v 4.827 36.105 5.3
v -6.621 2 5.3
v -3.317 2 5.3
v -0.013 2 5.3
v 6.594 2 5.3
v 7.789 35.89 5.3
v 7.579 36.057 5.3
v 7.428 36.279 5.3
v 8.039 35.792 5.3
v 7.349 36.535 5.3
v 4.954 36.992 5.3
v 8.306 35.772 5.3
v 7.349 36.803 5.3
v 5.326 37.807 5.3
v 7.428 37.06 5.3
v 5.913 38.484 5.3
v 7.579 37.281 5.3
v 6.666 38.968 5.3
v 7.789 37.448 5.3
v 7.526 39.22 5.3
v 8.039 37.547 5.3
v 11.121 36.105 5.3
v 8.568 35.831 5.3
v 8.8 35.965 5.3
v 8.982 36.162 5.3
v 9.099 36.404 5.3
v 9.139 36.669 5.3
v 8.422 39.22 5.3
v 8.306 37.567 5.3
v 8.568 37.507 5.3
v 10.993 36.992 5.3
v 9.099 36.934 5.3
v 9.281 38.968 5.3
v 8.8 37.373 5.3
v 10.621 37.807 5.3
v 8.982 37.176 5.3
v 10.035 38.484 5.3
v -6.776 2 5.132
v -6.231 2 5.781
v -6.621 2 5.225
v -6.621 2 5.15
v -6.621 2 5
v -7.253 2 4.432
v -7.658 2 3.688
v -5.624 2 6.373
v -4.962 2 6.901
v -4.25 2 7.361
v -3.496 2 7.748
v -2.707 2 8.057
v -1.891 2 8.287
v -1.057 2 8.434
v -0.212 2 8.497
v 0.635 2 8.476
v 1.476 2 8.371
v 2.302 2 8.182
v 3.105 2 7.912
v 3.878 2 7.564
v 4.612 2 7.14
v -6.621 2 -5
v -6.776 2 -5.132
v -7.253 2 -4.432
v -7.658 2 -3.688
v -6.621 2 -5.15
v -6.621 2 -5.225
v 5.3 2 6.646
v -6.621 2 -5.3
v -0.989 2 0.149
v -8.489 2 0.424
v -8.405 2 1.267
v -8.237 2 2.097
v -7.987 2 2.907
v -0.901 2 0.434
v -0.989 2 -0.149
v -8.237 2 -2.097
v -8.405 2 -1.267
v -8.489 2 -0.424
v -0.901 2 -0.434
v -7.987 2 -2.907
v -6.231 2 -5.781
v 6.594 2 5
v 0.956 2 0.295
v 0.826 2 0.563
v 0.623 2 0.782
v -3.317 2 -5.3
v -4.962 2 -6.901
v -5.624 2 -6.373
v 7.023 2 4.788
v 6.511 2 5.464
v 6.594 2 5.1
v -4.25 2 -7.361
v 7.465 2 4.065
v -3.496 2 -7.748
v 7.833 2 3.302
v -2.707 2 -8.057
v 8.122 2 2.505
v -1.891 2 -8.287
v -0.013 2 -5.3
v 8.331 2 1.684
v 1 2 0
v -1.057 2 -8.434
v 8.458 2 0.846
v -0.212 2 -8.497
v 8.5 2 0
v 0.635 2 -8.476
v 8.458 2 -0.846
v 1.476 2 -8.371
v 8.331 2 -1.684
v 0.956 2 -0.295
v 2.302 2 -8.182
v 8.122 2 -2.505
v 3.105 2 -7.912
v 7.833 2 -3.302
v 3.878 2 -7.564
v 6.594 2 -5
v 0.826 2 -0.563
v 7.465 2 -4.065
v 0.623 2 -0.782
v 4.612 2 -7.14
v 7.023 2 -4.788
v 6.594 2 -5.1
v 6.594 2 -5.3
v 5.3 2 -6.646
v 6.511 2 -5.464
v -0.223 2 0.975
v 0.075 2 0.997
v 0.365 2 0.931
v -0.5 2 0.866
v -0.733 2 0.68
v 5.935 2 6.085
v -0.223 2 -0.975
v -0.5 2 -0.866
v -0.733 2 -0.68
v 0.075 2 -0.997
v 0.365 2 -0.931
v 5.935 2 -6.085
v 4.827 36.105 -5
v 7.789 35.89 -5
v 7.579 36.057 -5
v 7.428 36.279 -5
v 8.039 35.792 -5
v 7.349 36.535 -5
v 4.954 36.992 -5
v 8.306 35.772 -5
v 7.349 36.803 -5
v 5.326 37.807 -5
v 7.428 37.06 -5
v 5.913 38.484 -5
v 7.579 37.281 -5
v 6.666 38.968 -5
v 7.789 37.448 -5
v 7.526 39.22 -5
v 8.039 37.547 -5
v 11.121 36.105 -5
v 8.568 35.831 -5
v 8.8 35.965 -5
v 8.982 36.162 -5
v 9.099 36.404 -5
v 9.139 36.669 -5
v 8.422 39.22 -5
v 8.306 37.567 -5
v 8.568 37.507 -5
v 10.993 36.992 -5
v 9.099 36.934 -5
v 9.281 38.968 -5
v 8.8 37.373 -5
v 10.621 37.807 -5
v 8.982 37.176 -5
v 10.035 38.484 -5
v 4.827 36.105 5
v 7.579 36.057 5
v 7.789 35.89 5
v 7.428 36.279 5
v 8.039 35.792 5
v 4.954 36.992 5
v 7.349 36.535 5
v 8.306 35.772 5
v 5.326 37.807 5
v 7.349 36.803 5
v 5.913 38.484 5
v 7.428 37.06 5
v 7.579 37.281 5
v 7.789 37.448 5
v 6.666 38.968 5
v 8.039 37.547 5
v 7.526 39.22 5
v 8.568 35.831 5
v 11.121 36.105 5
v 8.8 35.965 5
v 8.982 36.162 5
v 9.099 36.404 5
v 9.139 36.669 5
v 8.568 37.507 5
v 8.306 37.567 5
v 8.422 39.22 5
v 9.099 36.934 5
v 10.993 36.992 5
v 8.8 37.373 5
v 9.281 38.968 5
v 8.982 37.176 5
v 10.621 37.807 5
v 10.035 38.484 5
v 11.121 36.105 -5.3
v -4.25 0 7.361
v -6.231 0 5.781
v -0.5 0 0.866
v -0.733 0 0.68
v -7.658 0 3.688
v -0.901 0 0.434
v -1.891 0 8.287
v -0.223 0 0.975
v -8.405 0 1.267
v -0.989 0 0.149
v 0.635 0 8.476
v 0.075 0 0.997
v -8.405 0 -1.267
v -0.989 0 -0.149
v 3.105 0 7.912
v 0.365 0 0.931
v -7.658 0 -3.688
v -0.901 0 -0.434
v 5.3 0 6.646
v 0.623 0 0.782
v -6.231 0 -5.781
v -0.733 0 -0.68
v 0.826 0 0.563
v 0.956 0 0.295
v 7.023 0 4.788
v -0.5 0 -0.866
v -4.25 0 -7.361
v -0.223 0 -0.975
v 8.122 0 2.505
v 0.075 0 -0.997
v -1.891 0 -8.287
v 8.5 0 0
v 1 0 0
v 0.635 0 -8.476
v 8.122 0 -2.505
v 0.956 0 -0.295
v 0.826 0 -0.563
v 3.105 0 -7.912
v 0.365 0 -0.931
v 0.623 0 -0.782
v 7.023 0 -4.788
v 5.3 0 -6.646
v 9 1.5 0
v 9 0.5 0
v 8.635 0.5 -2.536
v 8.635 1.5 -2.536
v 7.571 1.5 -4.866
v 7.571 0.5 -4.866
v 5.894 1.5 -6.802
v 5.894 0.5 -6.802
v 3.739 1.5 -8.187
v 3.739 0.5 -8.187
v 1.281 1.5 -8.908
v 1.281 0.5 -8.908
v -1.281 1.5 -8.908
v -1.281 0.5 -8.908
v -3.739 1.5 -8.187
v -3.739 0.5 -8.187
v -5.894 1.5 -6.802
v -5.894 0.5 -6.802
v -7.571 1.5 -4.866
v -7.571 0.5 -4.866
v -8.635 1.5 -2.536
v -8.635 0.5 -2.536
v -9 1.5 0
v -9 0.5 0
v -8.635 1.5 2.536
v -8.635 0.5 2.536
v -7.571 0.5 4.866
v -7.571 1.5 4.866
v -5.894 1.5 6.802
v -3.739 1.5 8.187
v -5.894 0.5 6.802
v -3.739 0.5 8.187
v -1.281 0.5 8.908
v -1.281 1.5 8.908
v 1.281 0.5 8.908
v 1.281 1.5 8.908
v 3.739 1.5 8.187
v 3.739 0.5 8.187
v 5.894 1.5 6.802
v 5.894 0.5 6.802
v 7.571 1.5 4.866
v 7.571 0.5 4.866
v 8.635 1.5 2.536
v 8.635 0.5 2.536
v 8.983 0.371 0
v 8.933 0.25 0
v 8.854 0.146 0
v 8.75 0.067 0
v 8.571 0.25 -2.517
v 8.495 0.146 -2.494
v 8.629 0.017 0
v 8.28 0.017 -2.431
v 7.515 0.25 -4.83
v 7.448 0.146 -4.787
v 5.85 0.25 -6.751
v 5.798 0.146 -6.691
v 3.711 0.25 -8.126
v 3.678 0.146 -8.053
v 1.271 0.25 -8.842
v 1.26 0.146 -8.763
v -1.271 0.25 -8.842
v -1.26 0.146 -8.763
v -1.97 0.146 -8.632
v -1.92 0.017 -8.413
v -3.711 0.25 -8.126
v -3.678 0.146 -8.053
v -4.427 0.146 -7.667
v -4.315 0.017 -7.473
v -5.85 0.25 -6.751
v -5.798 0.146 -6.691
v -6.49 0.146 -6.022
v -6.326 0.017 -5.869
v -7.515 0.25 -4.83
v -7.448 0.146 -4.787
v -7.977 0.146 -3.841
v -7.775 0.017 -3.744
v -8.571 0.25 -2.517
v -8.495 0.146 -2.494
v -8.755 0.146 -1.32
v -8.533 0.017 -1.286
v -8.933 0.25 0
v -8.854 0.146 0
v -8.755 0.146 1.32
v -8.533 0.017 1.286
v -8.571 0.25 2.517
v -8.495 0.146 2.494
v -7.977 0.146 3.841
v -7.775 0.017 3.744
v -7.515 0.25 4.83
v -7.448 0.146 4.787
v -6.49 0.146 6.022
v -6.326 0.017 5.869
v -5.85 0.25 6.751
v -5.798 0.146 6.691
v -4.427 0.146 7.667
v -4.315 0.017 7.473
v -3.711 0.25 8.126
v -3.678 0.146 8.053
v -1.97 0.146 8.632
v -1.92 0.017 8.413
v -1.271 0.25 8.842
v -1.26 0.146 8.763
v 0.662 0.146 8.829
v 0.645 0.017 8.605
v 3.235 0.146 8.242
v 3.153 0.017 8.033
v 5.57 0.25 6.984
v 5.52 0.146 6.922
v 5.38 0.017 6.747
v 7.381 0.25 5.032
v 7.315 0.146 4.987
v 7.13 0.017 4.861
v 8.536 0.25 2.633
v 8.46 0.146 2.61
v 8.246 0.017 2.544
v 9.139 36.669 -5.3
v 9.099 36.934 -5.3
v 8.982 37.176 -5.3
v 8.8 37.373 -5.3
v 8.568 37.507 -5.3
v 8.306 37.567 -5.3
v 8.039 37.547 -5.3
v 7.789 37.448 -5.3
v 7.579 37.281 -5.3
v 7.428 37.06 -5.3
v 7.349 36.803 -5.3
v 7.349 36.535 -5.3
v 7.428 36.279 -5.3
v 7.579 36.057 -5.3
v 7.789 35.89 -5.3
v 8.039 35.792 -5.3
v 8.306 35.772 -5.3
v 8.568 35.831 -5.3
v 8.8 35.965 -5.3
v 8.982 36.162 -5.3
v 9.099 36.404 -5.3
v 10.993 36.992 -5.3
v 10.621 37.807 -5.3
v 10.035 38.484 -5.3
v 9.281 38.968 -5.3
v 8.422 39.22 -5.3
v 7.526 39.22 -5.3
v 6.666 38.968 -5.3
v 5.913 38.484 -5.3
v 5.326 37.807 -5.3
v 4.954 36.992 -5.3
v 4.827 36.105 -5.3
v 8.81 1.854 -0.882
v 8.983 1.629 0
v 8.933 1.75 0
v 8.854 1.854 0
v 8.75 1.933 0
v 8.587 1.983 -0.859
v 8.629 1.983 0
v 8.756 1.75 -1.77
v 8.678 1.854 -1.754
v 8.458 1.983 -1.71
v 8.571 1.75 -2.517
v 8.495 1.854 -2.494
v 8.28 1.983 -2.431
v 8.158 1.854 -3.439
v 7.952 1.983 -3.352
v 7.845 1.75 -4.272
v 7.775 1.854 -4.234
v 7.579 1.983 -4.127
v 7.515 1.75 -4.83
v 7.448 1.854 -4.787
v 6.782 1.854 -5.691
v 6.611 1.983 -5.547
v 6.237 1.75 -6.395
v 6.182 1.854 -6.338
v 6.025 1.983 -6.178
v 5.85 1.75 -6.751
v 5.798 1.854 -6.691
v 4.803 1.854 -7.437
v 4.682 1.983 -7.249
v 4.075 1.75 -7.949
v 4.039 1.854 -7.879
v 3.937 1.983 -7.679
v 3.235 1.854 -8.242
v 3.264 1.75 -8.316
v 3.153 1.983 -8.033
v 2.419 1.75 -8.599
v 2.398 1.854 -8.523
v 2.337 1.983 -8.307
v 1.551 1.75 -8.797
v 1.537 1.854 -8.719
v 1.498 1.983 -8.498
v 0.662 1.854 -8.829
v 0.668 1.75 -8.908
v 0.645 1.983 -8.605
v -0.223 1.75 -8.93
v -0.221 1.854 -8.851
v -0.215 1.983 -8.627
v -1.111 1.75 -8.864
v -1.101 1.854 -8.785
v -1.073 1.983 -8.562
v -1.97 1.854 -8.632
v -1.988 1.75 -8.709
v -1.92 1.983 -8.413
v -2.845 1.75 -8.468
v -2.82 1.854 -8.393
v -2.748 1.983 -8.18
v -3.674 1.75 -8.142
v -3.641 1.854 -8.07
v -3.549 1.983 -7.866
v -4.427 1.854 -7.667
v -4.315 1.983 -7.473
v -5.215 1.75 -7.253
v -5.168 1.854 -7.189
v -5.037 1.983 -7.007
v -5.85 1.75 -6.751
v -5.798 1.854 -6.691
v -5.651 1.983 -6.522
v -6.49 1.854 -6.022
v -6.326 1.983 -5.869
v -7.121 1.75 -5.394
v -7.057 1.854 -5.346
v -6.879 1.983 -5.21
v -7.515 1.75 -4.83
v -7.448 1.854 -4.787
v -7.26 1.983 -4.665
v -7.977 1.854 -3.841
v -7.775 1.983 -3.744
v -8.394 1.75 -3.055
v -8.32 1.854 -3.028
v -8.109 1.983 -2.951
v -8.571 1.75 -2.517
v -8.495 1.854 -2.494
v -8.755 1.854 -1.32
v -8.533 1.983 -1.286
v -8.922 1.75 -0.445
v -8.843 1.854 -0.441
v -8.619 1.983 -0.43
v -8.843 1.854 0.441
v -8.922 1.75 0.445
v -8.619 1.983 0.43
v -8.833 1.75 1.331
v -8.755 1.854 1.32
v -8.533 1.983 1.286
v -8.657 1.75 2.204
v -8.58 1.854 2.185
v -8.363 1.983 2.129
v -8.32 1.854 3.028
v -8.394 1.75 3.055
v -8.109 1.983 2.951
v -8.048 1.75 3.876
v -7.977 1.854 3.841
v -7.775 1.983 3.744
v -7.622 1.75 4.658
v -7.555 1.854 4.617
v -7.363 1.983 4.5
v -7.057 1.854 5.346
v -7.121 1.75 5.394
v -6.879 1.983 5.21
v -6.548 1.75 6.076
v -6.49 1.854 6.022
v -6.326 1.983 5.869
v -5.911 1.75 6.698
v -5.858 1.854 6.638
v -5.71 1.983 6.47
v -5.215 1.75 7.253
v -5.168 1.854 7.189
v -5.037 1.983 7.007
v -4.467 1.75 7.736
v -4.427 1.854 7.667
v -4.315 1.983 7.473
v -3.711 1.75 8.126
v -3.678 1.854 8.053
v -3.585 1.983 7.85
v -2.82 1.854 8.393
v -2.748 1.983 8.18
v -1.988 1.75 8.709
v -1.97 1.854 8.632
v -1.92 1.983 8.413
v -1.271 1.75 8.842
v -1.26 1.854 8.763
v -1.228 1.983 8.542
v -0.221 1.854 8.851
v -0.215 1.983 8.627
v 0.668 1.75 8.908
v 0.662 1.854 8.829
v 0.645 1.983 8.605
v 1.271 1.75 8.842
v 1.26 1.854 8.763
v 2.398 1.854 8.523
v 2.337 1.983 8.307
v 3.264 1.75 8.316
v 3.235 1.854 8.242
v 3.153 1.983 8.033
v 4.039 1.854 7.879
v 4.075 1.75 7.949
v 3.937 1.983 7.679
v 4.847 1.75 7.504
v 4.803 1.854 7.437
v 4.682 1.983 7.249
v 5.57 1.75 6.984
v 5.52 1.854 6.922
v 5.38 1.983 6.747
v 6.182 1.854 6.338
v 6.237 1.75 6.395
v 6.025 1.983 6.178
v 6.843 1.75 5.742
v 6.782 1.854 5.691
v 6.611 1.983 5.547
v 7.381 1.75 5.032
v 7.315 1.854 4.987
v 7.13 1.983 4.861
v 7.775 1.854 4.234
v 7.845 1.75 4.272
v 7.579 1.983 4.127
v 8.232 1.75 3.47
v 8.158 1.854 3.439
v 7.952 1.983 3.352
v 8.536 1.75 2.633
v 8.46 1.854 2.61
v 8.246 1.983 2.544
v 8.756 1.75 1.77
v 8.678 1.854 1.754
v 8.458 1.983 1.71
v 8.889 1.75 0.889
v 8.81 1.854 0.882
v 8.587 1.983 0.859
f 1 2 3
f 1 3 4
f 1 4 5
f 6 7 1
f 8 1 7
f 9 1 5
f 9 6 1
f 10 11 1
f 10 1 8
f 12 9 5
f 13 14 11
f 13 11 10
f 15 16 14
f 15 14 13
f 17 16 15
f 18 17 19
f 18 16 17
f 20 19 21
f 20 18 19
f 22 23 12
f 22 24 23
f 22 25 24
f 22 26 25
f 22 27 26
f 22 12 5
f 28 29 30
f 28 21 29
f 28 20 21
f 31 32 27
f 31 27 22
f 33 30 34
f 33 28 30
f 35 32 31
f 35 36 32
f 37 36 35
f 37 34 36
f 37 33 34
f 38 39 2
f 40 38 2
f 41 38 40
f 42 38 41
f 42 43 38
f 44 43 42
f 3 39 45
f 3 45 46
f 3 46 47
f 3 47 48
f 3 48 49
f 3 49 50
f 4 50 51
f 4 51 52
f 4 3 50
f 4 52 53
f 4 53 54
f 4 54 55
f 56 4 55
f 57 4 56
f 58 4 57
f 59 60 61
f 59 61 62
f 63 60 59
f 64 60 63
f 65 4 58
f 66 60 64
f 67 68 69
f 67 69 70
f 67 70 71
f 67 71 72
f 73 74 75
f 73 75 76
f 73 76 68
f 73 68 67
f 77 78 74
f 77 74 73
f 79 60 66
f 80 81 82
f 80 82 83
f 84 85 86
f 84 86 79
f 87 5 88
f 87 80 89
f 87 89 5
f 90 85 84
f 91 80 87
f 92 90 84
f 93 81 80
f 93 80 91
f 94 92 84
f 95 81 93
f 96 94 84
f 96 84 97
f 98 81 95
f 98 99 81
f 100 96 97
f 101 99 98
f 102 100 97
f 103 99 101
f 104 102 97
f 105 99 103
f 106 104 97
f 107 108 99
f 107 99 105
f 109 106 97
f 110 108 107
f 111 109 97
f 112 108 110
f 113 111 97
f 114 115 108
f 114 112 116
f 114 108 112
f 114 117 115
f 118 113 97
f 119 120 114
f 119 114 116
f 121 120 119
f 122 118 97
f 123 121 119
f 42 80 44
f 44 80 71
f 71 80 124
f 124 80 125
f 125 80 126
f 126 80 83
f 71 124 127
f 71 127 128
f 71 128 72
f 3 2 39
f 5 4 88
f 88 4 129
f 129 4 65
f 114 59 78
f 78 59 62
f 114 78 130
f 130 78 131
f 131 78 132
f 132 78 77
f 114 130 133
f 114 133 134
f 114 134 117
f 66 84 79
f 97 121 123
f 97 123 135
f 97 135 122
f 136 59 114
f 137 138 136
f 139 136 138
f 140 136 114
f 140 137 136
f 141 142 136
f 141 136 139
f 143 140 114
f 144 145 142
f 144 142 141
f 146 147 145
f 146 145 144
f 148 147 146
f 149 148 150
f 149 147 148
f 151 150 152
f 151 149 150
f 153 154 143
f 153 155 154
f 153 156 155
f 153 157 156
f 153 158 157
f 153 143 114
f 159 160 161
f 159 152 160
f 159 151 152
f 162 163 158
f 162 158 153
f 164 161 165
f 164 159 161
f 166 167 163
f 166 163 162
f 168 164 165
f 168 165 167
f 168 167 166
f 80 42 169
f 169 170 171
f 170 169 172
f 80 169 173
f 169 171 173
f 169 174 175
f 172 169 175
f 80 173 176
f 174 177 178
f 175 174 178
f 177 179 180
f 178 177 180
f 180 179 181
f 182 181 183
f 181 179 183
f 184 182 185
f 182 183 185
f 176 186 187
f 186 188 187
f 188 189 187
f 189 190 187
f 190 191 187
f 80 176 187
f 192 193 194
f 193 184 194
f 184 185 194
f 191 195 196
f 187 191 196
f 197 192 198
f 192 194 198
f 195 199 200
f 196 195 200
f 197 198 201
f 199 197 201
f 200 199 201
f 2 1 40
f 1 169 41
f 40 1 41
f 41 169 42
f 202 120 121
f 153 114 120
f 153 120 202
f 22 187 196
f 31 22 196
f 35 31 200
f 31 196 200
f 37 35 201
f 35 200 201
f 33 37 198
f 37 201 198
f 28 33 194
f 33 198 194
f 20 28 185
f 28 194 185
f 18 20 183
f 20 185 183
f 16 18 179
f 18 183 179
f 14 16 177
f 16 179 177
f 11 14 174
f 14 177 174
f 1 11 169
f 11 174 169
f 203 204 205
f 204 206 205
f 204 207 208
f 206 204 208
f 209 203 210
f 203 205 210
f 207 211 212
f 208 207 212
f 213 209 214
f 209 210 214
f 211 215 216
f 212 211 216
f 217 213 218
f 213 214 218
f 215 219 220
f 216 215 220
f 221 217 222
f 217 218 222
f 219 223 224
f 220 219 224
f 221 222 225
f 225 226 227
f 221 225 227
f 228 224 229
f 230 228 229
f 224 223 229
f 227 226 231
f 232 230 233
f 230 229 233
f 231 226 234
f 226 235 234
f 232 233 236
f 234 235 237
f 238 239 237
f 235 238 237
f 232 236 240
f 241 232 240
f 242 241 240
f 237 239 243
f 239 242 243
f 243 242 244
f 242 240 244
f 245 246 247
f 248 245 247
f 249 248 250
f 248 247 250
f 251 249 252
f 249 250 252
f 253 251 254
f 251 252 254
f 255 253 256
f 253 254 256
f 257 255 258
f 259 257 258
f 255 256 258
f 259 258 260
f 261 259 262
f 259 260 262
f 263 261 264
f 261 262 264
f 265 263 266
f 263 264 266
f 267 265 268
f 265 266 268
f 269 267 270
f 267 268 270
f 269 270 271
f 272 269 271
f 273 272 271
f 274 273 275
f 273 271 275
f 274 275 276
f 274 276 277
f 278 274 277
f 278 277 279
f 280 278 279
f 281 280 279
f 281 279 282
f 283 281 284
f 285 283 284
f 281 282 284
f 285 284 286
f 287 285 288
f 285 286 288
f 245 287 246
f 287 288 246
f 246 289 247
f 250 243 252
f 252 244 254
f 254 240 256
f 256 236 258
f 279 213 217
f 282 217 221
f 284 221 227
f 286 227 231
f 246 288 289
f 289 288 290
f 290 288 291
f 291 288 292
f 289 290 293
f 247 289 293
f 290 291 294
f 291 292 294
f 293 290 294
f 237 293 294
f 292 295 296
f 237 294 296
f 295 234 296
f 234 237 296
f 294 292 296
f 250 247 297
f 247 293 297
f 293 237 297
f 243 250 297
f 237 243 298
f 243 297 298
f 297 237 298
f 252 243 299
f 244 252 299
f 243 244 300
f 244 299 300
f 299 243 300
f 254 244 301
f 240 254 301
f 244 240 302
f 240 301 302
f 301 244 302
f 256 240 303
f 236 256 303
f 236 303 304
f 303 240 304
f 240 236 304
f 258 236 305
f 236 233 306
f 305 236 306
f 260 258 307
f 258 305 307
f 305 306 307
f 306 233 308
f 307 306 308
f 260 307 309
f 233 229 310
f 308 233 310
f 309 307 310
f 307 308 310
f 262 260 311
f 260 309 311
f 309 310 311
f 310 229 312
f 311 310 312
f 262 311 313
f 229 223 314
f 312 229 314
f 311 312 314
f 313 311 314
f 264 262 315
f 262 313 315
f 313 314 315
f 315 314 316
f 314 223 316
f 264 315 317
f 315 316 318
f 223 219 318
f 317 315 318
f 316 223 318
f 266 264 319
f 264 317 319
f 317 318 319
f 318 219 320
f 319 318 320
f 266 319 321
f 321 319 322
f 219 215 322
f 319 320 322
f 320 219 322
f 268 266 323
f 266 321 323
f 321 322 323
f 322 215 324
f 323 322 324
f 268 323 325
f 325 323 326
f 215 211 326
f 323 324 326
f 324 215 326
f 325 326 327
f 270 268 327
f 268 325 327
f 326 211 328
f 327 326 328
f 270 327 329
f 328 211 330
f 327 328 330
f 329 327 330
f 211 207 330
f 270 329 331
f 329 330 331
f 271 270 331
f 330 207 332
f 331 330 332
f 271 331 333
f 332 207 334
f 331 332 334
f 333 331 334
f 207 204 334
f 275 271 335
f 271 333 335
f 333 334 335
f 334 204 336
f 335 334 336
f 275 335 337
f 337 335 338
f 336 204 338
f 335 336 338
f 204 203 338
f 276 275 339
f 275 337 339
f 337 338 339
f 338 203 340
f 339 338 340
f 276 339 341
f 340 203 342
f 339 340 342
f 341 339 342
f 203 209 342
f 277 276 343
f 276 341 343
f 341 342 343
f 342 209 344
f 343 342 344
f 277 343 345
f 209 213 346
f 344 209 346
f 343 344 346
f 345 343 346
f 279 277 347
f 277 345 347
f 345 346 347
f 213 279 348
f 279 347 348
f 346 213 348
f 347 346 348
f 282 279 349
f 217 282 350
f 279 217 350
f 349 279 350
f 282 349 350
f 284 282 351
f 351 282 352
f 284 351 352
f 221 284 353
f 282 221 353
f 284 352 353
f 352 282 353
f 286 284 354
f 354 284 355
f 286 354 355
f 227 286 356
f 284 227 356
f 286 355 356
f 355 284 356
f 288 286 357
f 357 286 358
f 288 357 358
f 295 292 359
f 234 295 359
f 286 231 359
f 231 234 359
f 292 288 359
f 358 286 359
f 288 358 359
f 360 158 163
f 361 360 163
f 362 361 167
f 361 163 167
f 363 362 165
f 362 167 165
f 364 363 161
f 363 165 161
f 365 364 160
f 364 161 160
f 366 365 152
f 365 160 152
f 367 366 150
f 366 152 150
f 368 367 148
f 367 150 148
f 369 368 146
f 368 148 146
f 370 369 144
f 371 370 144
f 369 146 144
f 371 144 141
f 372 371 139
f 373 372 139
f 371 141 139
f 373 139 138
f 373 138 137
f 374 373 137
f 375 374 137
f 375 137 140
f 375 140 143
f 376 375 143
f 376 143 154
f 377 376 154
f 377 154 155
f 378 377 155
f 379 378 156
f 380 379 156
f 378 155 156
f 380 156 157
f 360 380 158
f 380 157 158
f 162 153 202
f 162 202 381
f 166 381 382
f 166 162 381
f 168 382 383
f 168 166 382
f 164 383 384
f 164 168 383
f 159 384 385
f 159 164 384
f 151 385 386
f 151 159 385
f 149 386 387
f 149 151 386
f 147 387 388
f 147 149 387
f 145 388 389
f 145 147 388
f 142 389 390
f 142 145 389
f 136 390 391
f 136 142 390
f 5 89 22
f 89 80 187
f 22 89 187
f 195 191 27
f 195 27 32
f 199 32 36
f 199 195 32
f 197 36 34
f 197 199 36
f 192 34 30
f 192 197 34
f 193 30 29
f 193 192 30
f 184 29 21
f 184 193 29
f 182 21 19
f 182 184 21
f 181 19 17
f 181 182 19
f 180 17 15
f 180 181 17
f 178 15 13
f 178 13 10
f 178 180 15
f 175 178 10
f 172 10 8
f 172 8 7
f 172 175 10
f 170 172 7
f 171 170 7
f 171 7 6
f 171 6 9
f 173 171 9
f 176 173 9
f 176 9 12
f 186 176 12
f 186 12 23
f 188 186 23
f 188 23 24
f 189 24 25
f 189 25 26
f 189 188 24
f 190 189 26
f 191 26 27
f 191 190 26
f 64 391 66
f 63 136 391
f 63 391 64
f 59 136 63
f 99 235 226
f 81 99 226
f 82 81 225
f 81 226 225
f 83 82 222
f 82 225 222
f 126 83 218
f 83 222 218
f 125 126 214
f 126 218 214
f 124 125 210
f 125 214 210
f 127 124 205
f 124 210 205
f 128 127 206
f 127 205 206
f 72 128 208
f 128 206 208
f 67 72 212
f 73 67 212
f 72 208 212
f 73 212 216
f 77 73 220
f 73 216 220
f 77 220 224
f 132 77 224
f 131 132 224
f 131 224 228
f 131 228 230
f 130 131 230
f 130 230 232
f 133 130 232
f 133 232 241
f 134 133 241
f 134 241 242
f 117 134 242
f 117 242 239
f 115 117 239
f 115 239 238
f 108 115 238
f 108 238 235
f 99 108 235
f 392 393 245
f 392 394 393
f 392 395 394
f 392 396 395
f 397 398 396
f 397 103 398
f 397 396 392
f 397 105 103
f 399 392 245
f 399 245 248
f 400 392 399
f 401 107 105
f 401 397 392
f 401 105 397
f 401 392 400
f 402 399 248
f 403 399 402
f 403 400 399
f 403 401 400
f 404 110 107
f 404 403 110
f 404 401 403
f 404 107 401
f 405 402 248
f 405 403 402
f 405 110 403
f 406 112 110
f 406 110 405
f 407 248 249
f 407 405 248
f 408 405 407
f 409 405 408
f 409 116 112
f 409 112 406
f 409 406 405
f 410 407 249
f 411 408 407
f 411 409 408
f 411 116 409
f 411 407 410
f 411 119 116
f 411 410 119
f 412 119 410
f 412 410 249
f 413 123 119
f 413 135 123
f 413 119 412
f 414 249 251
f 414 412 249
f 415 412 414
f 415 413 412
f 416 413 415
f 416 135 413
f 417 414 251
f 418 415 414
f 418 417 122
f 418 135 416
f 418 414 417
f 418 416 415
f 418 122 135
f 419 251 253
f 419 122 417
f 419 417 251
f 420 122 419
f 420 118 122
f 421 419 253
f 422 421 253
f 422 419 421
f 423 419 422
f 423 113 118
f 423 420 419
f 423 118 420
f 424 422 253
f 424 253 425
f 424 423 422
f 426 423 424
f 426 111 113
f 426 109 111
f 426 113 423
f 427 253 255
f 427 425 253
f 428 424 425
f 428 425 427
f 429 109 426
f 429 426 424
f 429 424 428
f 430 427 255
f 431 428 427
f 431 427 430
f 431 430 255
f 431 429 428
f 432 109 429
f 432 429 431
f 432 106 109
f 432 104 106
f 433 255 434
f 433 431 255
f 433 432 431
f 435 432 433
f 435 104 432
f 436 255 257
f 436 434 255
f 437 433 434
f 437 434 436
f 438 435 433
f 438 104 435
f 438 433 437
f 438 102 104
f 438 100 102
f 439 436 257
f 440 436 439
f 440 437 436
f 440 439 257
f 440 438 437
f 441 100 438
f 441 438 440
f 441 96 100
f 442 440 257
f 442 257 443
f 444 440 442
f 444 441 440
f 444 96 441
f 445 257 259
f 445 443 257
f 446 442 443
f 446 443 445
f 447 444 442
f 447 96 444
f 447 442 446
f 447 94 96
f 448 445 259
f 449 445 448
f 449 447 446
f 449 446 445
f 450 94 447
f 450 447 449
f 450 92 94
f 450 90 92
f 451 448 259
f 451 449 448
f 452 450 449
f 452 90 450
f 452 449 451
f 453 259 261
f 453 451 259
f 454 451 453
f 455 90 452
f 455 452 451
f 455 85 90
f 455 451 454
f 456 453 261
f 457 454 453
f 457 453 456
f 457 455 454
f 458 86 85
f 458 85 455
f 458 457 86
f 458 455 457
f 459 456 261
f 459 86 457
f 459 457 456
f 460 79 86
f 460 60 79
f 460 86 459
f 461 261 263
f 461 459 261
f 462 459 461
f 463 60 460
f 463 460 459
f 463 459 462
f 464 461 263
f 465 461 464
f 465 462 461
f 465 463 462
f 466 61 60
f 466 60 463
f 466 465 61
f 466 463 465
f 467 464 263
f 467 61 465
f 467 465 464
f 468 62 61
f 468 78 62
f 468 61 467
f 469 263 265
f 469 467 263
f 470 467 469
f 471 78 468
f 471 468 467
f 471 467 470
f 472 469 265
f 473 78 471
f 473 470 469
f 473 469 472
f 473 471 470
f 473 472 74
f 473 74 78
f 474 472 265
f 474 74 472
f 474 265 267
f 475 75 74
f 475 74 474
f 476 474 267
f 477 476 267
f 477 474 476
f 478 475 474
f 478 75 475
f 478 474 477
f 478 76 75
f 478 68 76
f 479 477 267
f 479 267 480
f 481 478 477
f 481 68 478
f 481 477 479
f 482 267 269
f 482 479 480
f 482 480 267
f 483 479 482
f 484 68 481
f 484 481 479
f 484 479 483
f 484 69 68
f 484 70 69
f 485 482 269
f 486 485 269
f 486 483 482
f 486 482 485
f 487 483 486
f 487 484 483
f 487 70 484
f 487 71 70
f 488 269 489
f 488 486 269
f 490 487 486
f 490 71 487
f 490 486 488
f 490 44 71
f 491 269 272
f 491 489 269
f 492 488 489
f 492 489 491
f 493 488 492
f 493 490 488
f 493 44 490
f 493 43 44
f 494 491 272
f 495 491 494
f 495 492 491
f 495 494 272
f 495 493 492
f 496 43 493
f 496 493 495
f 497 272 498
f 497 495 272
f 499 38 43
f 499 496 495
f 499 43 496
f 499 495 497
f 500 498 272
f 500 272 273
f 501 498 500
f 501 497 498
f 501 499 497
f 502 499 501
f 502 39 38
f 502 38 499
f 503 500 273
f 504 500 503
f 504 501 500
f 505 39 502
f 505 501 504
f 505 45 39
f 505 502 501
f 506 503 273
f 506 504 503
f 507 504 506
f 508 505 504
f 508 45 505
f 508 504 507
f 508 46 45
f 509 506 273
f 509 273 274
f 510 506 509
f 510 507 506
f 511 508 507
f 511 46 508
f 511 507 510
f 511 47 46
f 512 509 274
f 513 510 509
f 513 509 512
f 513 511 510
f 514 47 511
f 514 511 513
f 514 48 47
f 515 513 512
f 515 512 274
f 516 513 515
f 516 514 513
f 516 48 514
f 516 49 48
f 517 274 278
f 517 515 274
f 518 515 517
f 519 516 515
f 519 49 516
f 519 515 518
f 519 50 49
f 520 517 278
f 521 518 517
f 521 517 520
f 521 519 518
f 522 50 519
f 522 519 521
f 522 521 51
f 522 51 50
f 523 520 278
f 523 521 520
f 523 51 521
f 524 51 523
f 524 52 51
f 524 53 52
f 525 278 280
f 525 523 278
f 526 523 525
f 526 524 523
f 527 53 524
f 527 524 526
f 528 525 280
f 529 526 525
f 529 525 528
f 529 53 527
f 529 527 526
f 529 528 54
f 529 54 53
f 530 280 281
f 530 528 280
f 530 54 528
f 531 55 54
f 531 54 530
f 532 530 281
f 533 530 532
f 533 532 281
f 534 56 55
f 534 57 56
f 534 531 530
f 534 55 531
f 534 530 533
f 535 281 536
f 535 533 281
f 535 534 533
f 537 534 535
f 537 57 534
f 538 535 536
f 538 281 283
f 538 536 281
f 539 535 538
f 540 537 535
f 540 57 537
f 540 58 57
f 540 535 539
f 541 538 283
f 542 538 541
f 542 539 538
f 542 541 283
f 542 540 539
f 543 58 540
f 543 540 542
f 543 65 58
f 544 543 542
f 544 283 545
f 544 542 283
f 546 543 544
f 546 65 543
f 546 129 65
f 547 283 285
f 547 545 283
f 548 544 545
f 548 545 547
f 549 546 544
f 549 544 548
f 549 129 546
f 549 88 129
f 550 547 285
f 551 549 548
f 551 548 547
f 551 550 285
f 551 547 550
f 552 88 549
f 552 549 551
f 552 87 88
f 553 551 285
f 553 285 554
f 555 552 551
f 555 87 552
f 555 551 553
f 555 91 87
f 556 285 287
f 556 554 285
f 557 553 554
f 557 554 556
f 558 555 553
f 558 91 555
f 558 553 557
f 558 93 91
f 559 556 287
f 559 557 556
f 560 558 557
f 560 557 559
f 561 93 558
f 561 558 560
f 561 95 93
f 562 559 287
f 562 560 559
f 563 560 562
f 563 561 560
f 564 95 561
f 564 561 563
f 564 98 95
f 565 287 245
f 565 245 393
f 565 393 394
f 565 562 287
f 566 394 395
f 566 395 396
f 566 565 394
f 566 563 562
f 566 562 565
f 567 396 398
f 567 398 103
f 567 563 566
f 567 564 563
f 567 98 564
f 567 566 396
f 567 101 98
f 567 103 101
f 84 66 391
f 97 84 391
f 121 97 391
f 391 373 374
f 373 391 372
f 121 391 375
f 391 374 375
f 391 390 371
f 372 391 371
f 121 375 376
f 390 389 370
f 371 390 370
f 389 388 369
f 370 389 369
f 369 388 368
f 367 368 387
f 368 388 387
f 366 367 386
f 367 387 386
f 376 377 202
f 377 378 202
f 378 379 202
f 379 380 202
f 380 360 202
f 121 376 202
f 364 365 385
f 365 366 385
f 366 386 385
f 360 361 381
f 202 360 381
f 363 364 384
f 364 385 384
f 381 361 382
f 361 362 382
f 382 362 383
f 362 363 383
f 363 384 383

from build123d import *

# Parameters (mm, degrees)
SKETCH1_R           = 9
BOSS_EXTRUDE1_DEPTH = 2
FILLET1_R           = 0.5
SKETCH11_R          = 0.9
BOSS_EXTRUDE5_DEPTH = 0.3
SKETCH14_R          = 1
CUT_EXTRUDE1_DEPTH  = 40.252373603


with BuildPart() as part:
    # Sketch1 → Boss-Extrude1 (new body)
    with BuildSketch(Plane(origin=(0, 0, 0), x_dir=(1, 0, 0), z_dir=(0, 1, 0))):
        Circle(SKETCH1_R)
    extrude(amount=BOSS_EXTRUDE1_DEPTH)

    # Fillet1
    fillet1_edges = [part.edges().sort_by_distance(p)[0] for p in [
        (-9, 0, 0),
        (-9, 2, 0),
    ]]
    fillet(fillet1_edges, radius=FILLET1_R)

    # Sketch11 → Boss-Extrude5 (add)
    with BuildSketch(Plane.XY.offset(5)):
        with BuildLine():
            Line((6.549863489, 1.669069214), (11.12076654, 36.105315389))
            ThreePointArc((11.12076654, 36.105315389), (7.973708326, 39.252373603), (4.826650112, 36.105315389))
            Line((4.826650112, 36.105315389), (-6.731624766, 1.669069214))
            Line((-6.731624766, 1.669069214), (6.549863489, 1.669069214))
        make_face()
        with Locations((8.238882634, 36.669069214)):
            Circle(SKETCH11_R, mode=Mode.SUBTRACT)
    boss_extrude5 = extrude(amount=BOSS_EXTRUDE5_DEPTH)

    # Mirror1: Boss-Extrude5 across plane
    add(boss_extrude5.mirror(Plane.XY))

    # Sketch14 → Cut-Extrude1 (cut, through all)
    with BuildSketch(Plane.XZ):
        Circle(SKETCH14_R)
    extrude(amount=-CUT_EXTRUDE1_DEPTH, mode=Mode.SUBTRACT)


solid = part.part
